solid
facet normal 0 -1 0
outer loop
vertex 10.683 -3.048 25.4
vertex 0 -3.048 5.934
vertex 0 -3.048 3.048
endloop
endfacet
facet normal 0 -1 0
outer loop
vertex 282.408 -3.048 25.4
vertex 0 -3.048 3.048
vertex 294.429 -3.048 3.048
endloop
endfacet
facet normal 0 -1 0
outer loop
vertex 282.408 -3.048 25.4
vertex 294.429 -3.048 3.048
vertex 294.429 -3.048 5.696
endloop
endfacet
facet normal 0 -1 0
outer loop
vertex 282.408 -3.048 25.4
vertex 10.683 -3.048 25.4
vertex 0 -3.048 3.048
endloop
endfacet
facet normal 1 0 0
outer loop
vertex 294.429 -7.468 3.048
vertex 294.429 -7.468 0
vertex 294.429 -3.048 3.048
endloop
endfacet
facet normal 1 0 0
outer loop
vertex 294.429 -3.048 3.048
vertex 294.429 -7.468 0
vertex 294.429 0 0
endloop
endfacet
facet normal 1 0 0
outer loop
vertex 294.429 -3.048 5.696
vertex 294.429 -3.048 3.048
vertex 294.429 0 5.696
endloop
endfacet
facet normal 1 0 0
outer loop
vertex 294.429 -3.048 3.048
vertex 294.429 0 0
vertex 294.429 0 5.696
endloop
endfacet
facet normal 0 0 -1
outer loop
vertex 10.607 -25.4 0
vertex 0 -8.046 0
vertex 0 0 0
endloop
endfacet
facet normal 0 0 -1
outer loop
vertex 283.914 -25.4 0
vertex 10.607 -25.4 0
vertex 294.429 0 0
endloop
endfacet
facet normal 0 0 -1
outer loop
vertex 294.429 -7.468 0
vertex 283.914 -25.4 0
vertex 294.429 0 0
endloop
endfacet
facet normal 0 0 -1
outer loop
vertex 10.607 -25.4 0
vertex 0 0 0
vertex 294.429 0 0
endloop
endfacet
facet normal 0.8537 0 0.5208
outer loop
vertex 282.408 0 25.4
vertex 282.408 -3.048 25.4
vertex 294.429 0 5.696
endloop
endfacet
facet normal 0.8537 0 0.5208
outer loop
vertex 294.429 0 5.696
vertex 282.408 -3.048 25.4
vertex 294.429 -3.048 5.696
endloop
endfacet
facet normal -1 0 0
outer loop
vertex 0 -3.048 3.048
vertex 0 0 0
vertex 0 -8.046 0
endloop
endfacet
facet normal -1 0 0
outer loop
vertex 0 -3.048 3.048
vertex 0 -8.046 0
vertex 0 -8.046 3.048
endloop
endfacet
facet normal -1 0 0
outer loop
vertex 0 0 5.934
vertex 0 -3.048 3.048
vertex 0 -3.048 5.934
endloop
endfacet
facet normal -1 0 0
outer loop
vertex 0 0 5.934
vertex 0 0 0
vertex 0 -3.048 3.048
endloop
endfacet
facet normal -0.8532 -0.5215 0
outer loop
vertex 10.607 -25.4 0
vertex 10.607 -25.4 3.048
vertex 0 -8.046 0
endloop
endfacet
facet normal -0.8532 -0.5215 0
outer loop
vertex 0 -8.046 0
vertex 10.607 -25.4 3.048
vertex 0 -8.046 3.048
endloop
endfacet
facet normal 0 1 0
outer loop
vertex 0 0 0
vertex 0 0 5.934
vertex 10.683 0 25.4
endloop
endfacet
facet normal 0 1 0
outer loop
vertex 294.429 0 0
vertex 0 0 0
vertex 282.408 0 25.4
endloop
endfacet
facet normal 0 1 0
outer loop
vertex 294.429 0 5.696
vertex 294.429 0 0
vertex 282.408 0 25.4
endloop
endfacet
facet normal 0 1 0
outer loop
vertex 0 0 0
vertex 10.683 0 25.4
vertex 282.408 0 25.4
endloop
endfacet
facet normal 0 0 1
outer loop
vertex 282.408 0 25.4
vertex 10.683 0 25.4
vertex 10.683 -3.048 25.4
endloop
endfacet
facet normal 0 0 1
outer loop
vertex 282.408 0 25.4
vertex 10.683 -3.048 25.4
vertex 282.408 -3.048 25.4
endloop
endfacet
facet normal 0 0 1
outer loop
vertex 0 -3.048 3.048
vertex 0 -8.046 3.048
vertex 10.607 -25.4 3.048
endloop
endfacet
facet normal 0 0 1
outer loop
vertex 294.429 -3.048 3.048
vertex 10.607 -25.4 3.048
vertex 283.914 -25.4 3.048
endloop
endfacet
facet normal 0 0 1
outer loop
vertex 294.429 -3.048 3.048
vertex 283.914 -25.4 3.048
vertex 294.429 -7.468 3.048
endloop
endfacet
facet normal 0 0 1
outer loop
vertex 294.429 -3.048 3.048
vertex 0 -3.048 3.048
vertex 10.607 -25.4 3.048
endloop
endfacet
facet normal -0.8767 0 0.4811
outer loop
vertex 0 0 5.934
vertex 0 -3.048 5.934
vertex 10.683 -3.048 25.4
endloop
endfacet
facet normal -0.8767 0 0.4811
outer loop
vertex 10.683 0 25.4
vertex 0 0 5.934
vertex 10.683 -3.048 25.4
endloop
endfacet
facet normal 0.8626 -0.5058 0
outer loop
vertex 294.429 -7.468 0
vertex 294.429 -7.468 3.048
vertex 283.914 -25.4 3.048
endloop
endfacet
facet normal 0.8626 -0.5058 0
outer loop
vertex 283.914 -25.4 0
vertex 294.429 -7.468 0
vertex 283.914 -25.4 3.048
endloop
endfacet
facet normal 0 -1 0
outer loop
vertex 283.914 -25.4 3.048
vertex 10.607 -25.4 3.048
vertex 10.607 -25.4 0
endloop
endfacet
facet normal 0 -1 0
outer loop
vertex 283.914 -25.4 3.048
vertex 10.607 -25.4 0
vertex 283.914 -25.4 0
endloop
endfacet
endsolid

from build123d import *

# Parameters (mm, degrees)
F0_W      = 294.42918
F0_H      = 25.4
F1_DEPTH  = 3.048
F2_W      = 294.42918
F2_H      = 3.048
F3_DEPTH  = 22.352
F5_DEPTH  = 25.4
F7_DEPTH  = 25.4
F9_DEPTH  = 25.4
F11_DEPTH = 25.4


with BuildPart() as f1:
    # F0 (on Front) → F1 (new body)
    with BuildSketch(Plane.XZ):
        with Locations((147.21459, 12.7)):
            Rectangle(F0_W, F0_H)
    extrude(amount=F1_DEPTH)

    # F2 (on face) → F3 (join)
    with BuildSketch(Plane.XZ.offset(3.048)):
        with Locations((147.21459, 1.524)):
            Rectangle(F2_W, F2_H)
    extrude(amount=F3_DEPTH)

    # F4 (on face) → F5 (cut)
    with BuildSketch(Plane.XZ.offset(3.048)):
        Polygon((0, 5.934239), (10.683293, 25.4), (4.401662, 35.47851), (-15.100691, 25.4), align=None)
    extrude(amount=-F5_DEPTH, mode=Mode.SUBTRACT)

    # F6 (on face) → F7 (cut)
    with BuildSketch(Plane.XY.offset(3.048)):
        Polygon((13.454681, -30.058125), (0, -8.04578), (-4.952007, -25.4), (9.960025, -44.26622), align=None)
    extrude(amount=-F7_DEPTH, mode=Mode.SUBTRACT)

    # F8 (on face) → F9 (cut)
    with BuildSketch(Plane.XY.offset(3.048)):
        Polygon((299.843073, 0), (294.42918, -7.468464), (280.858219, -30.611685), (297.753662, -36.44076), align=None)
    extrude(amount=-F9_DEPTH, mode=Mode.SUBTRACT)

    # F10 (on face) → F11 (cut)
    with BuildSketch(Plane.XZ.offset(3.048)):
        Polygon((279.356599, 30.402403), (294.42918, 5.696148), (301.659763, 3.048), (311.673284, 34.467302), align=None)
    extrude(amount=-F11_DEPTH, mode=Mode.SUBTRACT)


solid = f1.part
